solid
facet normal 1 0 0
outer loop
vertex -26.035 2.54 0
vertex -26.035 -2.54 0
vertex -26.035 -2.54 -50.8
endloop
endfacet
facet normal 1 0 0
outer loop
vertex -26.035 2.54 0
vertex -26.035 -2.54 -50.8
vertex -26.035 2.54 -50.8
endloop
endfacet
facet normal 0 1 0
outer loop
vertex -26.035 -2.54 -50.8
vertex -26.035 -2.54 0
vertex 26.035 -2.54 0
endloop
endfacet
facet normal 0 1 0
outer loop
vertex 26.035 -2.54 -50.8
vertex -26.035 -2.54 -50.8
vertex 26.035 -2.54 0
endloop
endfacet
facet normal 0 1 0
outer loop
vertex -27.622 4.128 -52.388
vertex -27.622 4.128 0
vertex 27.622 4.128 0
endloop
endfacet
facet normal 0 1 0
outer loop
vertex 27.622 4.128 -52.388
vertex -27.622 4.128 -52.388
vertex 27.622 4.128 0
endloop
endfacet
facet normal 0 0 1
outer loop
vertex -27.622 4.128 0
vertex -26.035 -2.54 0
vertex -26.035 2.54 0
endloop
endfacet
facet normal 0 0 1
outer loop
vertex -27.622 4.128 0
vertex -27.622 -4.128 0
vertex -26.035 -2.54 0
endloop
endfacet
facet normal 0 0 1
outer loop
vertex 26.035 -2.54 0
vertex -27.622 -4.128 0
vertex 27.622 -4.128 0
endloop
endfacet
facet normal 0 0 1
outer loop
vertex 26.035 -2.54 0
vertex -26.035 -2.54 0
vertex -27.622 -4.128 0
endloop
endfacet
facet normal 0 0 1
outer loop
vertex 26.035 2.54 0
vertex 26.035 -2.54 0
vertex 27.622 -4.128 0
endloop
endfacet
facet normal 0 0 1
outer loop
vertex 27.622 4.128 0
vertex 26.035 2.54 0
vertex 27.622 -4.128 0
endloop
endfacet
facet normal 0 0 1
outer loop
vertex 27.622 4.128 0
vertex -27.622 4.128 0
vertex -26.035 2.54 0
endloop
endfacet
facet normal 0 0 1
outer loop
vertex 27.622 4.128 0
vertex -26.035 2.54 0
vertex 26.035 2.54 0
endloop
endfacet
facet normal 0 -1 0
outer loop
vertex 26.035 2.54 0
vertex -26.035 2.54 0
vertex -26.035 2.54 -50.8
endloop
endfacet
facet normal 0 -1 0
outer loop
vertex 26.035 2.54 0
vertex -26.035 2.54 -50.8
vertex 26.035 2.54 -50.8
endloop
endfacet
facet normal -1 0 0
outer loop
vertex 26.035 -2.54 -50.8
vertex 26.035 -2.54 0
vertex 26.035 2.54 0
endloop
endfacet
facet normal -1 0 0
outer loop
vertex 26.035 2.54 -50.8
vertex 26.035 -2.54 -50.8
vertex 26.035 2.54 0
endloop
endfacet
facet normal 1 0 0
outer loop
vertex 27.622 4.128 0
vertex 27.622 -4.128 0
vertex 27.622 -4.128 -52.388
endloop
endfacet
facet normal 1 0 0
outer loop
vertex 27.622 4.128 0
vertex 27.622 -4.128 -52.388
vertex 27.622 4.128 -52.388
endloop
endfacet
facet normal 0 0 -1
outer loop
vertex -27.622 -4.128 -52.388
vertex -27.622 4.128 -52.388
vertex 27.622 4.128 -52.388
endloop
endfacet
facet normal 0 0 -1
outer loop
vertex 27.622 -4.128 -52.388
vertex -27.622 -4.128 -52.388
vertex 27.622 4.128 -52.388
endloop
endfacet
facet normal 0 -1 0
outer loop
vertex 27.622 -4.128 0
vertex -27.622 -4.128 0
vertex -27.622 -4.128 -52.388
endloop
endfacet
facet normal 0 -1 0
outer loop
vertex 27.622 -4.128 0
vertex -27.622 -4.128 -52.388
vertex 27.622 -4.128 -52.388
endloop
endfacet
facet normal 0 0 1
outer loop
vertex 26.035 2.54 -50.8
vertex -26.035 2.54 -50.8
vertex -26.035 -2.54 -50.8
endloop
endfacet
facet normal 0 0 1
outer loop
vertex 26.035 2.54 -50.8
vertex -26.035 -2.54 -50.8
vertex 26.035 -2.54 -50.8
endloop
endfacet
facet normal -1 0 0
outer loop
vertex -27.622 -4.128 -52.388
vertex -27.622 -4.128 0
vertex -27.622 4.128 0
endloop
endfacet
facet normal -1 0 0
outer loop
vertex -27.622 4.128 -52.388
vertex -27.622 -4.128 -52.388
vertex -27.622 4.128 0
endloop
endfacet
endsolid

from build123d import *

# Parameters (mm, degrees)
F0_W     = 55.245
F0_H     = 8.255
F0_W_2   = 52.07
F0_H_2   = 5.08
F1_DEPTH = 52.3875
F2_DEPTH = 50.8


with BuildPart() as f1:
    # F0 (on Top) → F1 (new body)
    with BuildSketch(Plane.XY):
        Rectangle(F0_W, F0_H)
        Rectangle(F0_W_2, F0_H_2, mode=Mode.SUBTRACT)
        Rectangle(F0_W_2, F0_H_2)
    extrude(amount=-F1_DEPTH)

    # F0 (on Top) → F2 (cut)
    with BuildSketch(Plane.XY):
        Rectangle(F0_W_2, F0_H_2)
    extrude(amount=-F2_DEPTH, mode=Mode.SUBTRACT)


solid = f1.part
